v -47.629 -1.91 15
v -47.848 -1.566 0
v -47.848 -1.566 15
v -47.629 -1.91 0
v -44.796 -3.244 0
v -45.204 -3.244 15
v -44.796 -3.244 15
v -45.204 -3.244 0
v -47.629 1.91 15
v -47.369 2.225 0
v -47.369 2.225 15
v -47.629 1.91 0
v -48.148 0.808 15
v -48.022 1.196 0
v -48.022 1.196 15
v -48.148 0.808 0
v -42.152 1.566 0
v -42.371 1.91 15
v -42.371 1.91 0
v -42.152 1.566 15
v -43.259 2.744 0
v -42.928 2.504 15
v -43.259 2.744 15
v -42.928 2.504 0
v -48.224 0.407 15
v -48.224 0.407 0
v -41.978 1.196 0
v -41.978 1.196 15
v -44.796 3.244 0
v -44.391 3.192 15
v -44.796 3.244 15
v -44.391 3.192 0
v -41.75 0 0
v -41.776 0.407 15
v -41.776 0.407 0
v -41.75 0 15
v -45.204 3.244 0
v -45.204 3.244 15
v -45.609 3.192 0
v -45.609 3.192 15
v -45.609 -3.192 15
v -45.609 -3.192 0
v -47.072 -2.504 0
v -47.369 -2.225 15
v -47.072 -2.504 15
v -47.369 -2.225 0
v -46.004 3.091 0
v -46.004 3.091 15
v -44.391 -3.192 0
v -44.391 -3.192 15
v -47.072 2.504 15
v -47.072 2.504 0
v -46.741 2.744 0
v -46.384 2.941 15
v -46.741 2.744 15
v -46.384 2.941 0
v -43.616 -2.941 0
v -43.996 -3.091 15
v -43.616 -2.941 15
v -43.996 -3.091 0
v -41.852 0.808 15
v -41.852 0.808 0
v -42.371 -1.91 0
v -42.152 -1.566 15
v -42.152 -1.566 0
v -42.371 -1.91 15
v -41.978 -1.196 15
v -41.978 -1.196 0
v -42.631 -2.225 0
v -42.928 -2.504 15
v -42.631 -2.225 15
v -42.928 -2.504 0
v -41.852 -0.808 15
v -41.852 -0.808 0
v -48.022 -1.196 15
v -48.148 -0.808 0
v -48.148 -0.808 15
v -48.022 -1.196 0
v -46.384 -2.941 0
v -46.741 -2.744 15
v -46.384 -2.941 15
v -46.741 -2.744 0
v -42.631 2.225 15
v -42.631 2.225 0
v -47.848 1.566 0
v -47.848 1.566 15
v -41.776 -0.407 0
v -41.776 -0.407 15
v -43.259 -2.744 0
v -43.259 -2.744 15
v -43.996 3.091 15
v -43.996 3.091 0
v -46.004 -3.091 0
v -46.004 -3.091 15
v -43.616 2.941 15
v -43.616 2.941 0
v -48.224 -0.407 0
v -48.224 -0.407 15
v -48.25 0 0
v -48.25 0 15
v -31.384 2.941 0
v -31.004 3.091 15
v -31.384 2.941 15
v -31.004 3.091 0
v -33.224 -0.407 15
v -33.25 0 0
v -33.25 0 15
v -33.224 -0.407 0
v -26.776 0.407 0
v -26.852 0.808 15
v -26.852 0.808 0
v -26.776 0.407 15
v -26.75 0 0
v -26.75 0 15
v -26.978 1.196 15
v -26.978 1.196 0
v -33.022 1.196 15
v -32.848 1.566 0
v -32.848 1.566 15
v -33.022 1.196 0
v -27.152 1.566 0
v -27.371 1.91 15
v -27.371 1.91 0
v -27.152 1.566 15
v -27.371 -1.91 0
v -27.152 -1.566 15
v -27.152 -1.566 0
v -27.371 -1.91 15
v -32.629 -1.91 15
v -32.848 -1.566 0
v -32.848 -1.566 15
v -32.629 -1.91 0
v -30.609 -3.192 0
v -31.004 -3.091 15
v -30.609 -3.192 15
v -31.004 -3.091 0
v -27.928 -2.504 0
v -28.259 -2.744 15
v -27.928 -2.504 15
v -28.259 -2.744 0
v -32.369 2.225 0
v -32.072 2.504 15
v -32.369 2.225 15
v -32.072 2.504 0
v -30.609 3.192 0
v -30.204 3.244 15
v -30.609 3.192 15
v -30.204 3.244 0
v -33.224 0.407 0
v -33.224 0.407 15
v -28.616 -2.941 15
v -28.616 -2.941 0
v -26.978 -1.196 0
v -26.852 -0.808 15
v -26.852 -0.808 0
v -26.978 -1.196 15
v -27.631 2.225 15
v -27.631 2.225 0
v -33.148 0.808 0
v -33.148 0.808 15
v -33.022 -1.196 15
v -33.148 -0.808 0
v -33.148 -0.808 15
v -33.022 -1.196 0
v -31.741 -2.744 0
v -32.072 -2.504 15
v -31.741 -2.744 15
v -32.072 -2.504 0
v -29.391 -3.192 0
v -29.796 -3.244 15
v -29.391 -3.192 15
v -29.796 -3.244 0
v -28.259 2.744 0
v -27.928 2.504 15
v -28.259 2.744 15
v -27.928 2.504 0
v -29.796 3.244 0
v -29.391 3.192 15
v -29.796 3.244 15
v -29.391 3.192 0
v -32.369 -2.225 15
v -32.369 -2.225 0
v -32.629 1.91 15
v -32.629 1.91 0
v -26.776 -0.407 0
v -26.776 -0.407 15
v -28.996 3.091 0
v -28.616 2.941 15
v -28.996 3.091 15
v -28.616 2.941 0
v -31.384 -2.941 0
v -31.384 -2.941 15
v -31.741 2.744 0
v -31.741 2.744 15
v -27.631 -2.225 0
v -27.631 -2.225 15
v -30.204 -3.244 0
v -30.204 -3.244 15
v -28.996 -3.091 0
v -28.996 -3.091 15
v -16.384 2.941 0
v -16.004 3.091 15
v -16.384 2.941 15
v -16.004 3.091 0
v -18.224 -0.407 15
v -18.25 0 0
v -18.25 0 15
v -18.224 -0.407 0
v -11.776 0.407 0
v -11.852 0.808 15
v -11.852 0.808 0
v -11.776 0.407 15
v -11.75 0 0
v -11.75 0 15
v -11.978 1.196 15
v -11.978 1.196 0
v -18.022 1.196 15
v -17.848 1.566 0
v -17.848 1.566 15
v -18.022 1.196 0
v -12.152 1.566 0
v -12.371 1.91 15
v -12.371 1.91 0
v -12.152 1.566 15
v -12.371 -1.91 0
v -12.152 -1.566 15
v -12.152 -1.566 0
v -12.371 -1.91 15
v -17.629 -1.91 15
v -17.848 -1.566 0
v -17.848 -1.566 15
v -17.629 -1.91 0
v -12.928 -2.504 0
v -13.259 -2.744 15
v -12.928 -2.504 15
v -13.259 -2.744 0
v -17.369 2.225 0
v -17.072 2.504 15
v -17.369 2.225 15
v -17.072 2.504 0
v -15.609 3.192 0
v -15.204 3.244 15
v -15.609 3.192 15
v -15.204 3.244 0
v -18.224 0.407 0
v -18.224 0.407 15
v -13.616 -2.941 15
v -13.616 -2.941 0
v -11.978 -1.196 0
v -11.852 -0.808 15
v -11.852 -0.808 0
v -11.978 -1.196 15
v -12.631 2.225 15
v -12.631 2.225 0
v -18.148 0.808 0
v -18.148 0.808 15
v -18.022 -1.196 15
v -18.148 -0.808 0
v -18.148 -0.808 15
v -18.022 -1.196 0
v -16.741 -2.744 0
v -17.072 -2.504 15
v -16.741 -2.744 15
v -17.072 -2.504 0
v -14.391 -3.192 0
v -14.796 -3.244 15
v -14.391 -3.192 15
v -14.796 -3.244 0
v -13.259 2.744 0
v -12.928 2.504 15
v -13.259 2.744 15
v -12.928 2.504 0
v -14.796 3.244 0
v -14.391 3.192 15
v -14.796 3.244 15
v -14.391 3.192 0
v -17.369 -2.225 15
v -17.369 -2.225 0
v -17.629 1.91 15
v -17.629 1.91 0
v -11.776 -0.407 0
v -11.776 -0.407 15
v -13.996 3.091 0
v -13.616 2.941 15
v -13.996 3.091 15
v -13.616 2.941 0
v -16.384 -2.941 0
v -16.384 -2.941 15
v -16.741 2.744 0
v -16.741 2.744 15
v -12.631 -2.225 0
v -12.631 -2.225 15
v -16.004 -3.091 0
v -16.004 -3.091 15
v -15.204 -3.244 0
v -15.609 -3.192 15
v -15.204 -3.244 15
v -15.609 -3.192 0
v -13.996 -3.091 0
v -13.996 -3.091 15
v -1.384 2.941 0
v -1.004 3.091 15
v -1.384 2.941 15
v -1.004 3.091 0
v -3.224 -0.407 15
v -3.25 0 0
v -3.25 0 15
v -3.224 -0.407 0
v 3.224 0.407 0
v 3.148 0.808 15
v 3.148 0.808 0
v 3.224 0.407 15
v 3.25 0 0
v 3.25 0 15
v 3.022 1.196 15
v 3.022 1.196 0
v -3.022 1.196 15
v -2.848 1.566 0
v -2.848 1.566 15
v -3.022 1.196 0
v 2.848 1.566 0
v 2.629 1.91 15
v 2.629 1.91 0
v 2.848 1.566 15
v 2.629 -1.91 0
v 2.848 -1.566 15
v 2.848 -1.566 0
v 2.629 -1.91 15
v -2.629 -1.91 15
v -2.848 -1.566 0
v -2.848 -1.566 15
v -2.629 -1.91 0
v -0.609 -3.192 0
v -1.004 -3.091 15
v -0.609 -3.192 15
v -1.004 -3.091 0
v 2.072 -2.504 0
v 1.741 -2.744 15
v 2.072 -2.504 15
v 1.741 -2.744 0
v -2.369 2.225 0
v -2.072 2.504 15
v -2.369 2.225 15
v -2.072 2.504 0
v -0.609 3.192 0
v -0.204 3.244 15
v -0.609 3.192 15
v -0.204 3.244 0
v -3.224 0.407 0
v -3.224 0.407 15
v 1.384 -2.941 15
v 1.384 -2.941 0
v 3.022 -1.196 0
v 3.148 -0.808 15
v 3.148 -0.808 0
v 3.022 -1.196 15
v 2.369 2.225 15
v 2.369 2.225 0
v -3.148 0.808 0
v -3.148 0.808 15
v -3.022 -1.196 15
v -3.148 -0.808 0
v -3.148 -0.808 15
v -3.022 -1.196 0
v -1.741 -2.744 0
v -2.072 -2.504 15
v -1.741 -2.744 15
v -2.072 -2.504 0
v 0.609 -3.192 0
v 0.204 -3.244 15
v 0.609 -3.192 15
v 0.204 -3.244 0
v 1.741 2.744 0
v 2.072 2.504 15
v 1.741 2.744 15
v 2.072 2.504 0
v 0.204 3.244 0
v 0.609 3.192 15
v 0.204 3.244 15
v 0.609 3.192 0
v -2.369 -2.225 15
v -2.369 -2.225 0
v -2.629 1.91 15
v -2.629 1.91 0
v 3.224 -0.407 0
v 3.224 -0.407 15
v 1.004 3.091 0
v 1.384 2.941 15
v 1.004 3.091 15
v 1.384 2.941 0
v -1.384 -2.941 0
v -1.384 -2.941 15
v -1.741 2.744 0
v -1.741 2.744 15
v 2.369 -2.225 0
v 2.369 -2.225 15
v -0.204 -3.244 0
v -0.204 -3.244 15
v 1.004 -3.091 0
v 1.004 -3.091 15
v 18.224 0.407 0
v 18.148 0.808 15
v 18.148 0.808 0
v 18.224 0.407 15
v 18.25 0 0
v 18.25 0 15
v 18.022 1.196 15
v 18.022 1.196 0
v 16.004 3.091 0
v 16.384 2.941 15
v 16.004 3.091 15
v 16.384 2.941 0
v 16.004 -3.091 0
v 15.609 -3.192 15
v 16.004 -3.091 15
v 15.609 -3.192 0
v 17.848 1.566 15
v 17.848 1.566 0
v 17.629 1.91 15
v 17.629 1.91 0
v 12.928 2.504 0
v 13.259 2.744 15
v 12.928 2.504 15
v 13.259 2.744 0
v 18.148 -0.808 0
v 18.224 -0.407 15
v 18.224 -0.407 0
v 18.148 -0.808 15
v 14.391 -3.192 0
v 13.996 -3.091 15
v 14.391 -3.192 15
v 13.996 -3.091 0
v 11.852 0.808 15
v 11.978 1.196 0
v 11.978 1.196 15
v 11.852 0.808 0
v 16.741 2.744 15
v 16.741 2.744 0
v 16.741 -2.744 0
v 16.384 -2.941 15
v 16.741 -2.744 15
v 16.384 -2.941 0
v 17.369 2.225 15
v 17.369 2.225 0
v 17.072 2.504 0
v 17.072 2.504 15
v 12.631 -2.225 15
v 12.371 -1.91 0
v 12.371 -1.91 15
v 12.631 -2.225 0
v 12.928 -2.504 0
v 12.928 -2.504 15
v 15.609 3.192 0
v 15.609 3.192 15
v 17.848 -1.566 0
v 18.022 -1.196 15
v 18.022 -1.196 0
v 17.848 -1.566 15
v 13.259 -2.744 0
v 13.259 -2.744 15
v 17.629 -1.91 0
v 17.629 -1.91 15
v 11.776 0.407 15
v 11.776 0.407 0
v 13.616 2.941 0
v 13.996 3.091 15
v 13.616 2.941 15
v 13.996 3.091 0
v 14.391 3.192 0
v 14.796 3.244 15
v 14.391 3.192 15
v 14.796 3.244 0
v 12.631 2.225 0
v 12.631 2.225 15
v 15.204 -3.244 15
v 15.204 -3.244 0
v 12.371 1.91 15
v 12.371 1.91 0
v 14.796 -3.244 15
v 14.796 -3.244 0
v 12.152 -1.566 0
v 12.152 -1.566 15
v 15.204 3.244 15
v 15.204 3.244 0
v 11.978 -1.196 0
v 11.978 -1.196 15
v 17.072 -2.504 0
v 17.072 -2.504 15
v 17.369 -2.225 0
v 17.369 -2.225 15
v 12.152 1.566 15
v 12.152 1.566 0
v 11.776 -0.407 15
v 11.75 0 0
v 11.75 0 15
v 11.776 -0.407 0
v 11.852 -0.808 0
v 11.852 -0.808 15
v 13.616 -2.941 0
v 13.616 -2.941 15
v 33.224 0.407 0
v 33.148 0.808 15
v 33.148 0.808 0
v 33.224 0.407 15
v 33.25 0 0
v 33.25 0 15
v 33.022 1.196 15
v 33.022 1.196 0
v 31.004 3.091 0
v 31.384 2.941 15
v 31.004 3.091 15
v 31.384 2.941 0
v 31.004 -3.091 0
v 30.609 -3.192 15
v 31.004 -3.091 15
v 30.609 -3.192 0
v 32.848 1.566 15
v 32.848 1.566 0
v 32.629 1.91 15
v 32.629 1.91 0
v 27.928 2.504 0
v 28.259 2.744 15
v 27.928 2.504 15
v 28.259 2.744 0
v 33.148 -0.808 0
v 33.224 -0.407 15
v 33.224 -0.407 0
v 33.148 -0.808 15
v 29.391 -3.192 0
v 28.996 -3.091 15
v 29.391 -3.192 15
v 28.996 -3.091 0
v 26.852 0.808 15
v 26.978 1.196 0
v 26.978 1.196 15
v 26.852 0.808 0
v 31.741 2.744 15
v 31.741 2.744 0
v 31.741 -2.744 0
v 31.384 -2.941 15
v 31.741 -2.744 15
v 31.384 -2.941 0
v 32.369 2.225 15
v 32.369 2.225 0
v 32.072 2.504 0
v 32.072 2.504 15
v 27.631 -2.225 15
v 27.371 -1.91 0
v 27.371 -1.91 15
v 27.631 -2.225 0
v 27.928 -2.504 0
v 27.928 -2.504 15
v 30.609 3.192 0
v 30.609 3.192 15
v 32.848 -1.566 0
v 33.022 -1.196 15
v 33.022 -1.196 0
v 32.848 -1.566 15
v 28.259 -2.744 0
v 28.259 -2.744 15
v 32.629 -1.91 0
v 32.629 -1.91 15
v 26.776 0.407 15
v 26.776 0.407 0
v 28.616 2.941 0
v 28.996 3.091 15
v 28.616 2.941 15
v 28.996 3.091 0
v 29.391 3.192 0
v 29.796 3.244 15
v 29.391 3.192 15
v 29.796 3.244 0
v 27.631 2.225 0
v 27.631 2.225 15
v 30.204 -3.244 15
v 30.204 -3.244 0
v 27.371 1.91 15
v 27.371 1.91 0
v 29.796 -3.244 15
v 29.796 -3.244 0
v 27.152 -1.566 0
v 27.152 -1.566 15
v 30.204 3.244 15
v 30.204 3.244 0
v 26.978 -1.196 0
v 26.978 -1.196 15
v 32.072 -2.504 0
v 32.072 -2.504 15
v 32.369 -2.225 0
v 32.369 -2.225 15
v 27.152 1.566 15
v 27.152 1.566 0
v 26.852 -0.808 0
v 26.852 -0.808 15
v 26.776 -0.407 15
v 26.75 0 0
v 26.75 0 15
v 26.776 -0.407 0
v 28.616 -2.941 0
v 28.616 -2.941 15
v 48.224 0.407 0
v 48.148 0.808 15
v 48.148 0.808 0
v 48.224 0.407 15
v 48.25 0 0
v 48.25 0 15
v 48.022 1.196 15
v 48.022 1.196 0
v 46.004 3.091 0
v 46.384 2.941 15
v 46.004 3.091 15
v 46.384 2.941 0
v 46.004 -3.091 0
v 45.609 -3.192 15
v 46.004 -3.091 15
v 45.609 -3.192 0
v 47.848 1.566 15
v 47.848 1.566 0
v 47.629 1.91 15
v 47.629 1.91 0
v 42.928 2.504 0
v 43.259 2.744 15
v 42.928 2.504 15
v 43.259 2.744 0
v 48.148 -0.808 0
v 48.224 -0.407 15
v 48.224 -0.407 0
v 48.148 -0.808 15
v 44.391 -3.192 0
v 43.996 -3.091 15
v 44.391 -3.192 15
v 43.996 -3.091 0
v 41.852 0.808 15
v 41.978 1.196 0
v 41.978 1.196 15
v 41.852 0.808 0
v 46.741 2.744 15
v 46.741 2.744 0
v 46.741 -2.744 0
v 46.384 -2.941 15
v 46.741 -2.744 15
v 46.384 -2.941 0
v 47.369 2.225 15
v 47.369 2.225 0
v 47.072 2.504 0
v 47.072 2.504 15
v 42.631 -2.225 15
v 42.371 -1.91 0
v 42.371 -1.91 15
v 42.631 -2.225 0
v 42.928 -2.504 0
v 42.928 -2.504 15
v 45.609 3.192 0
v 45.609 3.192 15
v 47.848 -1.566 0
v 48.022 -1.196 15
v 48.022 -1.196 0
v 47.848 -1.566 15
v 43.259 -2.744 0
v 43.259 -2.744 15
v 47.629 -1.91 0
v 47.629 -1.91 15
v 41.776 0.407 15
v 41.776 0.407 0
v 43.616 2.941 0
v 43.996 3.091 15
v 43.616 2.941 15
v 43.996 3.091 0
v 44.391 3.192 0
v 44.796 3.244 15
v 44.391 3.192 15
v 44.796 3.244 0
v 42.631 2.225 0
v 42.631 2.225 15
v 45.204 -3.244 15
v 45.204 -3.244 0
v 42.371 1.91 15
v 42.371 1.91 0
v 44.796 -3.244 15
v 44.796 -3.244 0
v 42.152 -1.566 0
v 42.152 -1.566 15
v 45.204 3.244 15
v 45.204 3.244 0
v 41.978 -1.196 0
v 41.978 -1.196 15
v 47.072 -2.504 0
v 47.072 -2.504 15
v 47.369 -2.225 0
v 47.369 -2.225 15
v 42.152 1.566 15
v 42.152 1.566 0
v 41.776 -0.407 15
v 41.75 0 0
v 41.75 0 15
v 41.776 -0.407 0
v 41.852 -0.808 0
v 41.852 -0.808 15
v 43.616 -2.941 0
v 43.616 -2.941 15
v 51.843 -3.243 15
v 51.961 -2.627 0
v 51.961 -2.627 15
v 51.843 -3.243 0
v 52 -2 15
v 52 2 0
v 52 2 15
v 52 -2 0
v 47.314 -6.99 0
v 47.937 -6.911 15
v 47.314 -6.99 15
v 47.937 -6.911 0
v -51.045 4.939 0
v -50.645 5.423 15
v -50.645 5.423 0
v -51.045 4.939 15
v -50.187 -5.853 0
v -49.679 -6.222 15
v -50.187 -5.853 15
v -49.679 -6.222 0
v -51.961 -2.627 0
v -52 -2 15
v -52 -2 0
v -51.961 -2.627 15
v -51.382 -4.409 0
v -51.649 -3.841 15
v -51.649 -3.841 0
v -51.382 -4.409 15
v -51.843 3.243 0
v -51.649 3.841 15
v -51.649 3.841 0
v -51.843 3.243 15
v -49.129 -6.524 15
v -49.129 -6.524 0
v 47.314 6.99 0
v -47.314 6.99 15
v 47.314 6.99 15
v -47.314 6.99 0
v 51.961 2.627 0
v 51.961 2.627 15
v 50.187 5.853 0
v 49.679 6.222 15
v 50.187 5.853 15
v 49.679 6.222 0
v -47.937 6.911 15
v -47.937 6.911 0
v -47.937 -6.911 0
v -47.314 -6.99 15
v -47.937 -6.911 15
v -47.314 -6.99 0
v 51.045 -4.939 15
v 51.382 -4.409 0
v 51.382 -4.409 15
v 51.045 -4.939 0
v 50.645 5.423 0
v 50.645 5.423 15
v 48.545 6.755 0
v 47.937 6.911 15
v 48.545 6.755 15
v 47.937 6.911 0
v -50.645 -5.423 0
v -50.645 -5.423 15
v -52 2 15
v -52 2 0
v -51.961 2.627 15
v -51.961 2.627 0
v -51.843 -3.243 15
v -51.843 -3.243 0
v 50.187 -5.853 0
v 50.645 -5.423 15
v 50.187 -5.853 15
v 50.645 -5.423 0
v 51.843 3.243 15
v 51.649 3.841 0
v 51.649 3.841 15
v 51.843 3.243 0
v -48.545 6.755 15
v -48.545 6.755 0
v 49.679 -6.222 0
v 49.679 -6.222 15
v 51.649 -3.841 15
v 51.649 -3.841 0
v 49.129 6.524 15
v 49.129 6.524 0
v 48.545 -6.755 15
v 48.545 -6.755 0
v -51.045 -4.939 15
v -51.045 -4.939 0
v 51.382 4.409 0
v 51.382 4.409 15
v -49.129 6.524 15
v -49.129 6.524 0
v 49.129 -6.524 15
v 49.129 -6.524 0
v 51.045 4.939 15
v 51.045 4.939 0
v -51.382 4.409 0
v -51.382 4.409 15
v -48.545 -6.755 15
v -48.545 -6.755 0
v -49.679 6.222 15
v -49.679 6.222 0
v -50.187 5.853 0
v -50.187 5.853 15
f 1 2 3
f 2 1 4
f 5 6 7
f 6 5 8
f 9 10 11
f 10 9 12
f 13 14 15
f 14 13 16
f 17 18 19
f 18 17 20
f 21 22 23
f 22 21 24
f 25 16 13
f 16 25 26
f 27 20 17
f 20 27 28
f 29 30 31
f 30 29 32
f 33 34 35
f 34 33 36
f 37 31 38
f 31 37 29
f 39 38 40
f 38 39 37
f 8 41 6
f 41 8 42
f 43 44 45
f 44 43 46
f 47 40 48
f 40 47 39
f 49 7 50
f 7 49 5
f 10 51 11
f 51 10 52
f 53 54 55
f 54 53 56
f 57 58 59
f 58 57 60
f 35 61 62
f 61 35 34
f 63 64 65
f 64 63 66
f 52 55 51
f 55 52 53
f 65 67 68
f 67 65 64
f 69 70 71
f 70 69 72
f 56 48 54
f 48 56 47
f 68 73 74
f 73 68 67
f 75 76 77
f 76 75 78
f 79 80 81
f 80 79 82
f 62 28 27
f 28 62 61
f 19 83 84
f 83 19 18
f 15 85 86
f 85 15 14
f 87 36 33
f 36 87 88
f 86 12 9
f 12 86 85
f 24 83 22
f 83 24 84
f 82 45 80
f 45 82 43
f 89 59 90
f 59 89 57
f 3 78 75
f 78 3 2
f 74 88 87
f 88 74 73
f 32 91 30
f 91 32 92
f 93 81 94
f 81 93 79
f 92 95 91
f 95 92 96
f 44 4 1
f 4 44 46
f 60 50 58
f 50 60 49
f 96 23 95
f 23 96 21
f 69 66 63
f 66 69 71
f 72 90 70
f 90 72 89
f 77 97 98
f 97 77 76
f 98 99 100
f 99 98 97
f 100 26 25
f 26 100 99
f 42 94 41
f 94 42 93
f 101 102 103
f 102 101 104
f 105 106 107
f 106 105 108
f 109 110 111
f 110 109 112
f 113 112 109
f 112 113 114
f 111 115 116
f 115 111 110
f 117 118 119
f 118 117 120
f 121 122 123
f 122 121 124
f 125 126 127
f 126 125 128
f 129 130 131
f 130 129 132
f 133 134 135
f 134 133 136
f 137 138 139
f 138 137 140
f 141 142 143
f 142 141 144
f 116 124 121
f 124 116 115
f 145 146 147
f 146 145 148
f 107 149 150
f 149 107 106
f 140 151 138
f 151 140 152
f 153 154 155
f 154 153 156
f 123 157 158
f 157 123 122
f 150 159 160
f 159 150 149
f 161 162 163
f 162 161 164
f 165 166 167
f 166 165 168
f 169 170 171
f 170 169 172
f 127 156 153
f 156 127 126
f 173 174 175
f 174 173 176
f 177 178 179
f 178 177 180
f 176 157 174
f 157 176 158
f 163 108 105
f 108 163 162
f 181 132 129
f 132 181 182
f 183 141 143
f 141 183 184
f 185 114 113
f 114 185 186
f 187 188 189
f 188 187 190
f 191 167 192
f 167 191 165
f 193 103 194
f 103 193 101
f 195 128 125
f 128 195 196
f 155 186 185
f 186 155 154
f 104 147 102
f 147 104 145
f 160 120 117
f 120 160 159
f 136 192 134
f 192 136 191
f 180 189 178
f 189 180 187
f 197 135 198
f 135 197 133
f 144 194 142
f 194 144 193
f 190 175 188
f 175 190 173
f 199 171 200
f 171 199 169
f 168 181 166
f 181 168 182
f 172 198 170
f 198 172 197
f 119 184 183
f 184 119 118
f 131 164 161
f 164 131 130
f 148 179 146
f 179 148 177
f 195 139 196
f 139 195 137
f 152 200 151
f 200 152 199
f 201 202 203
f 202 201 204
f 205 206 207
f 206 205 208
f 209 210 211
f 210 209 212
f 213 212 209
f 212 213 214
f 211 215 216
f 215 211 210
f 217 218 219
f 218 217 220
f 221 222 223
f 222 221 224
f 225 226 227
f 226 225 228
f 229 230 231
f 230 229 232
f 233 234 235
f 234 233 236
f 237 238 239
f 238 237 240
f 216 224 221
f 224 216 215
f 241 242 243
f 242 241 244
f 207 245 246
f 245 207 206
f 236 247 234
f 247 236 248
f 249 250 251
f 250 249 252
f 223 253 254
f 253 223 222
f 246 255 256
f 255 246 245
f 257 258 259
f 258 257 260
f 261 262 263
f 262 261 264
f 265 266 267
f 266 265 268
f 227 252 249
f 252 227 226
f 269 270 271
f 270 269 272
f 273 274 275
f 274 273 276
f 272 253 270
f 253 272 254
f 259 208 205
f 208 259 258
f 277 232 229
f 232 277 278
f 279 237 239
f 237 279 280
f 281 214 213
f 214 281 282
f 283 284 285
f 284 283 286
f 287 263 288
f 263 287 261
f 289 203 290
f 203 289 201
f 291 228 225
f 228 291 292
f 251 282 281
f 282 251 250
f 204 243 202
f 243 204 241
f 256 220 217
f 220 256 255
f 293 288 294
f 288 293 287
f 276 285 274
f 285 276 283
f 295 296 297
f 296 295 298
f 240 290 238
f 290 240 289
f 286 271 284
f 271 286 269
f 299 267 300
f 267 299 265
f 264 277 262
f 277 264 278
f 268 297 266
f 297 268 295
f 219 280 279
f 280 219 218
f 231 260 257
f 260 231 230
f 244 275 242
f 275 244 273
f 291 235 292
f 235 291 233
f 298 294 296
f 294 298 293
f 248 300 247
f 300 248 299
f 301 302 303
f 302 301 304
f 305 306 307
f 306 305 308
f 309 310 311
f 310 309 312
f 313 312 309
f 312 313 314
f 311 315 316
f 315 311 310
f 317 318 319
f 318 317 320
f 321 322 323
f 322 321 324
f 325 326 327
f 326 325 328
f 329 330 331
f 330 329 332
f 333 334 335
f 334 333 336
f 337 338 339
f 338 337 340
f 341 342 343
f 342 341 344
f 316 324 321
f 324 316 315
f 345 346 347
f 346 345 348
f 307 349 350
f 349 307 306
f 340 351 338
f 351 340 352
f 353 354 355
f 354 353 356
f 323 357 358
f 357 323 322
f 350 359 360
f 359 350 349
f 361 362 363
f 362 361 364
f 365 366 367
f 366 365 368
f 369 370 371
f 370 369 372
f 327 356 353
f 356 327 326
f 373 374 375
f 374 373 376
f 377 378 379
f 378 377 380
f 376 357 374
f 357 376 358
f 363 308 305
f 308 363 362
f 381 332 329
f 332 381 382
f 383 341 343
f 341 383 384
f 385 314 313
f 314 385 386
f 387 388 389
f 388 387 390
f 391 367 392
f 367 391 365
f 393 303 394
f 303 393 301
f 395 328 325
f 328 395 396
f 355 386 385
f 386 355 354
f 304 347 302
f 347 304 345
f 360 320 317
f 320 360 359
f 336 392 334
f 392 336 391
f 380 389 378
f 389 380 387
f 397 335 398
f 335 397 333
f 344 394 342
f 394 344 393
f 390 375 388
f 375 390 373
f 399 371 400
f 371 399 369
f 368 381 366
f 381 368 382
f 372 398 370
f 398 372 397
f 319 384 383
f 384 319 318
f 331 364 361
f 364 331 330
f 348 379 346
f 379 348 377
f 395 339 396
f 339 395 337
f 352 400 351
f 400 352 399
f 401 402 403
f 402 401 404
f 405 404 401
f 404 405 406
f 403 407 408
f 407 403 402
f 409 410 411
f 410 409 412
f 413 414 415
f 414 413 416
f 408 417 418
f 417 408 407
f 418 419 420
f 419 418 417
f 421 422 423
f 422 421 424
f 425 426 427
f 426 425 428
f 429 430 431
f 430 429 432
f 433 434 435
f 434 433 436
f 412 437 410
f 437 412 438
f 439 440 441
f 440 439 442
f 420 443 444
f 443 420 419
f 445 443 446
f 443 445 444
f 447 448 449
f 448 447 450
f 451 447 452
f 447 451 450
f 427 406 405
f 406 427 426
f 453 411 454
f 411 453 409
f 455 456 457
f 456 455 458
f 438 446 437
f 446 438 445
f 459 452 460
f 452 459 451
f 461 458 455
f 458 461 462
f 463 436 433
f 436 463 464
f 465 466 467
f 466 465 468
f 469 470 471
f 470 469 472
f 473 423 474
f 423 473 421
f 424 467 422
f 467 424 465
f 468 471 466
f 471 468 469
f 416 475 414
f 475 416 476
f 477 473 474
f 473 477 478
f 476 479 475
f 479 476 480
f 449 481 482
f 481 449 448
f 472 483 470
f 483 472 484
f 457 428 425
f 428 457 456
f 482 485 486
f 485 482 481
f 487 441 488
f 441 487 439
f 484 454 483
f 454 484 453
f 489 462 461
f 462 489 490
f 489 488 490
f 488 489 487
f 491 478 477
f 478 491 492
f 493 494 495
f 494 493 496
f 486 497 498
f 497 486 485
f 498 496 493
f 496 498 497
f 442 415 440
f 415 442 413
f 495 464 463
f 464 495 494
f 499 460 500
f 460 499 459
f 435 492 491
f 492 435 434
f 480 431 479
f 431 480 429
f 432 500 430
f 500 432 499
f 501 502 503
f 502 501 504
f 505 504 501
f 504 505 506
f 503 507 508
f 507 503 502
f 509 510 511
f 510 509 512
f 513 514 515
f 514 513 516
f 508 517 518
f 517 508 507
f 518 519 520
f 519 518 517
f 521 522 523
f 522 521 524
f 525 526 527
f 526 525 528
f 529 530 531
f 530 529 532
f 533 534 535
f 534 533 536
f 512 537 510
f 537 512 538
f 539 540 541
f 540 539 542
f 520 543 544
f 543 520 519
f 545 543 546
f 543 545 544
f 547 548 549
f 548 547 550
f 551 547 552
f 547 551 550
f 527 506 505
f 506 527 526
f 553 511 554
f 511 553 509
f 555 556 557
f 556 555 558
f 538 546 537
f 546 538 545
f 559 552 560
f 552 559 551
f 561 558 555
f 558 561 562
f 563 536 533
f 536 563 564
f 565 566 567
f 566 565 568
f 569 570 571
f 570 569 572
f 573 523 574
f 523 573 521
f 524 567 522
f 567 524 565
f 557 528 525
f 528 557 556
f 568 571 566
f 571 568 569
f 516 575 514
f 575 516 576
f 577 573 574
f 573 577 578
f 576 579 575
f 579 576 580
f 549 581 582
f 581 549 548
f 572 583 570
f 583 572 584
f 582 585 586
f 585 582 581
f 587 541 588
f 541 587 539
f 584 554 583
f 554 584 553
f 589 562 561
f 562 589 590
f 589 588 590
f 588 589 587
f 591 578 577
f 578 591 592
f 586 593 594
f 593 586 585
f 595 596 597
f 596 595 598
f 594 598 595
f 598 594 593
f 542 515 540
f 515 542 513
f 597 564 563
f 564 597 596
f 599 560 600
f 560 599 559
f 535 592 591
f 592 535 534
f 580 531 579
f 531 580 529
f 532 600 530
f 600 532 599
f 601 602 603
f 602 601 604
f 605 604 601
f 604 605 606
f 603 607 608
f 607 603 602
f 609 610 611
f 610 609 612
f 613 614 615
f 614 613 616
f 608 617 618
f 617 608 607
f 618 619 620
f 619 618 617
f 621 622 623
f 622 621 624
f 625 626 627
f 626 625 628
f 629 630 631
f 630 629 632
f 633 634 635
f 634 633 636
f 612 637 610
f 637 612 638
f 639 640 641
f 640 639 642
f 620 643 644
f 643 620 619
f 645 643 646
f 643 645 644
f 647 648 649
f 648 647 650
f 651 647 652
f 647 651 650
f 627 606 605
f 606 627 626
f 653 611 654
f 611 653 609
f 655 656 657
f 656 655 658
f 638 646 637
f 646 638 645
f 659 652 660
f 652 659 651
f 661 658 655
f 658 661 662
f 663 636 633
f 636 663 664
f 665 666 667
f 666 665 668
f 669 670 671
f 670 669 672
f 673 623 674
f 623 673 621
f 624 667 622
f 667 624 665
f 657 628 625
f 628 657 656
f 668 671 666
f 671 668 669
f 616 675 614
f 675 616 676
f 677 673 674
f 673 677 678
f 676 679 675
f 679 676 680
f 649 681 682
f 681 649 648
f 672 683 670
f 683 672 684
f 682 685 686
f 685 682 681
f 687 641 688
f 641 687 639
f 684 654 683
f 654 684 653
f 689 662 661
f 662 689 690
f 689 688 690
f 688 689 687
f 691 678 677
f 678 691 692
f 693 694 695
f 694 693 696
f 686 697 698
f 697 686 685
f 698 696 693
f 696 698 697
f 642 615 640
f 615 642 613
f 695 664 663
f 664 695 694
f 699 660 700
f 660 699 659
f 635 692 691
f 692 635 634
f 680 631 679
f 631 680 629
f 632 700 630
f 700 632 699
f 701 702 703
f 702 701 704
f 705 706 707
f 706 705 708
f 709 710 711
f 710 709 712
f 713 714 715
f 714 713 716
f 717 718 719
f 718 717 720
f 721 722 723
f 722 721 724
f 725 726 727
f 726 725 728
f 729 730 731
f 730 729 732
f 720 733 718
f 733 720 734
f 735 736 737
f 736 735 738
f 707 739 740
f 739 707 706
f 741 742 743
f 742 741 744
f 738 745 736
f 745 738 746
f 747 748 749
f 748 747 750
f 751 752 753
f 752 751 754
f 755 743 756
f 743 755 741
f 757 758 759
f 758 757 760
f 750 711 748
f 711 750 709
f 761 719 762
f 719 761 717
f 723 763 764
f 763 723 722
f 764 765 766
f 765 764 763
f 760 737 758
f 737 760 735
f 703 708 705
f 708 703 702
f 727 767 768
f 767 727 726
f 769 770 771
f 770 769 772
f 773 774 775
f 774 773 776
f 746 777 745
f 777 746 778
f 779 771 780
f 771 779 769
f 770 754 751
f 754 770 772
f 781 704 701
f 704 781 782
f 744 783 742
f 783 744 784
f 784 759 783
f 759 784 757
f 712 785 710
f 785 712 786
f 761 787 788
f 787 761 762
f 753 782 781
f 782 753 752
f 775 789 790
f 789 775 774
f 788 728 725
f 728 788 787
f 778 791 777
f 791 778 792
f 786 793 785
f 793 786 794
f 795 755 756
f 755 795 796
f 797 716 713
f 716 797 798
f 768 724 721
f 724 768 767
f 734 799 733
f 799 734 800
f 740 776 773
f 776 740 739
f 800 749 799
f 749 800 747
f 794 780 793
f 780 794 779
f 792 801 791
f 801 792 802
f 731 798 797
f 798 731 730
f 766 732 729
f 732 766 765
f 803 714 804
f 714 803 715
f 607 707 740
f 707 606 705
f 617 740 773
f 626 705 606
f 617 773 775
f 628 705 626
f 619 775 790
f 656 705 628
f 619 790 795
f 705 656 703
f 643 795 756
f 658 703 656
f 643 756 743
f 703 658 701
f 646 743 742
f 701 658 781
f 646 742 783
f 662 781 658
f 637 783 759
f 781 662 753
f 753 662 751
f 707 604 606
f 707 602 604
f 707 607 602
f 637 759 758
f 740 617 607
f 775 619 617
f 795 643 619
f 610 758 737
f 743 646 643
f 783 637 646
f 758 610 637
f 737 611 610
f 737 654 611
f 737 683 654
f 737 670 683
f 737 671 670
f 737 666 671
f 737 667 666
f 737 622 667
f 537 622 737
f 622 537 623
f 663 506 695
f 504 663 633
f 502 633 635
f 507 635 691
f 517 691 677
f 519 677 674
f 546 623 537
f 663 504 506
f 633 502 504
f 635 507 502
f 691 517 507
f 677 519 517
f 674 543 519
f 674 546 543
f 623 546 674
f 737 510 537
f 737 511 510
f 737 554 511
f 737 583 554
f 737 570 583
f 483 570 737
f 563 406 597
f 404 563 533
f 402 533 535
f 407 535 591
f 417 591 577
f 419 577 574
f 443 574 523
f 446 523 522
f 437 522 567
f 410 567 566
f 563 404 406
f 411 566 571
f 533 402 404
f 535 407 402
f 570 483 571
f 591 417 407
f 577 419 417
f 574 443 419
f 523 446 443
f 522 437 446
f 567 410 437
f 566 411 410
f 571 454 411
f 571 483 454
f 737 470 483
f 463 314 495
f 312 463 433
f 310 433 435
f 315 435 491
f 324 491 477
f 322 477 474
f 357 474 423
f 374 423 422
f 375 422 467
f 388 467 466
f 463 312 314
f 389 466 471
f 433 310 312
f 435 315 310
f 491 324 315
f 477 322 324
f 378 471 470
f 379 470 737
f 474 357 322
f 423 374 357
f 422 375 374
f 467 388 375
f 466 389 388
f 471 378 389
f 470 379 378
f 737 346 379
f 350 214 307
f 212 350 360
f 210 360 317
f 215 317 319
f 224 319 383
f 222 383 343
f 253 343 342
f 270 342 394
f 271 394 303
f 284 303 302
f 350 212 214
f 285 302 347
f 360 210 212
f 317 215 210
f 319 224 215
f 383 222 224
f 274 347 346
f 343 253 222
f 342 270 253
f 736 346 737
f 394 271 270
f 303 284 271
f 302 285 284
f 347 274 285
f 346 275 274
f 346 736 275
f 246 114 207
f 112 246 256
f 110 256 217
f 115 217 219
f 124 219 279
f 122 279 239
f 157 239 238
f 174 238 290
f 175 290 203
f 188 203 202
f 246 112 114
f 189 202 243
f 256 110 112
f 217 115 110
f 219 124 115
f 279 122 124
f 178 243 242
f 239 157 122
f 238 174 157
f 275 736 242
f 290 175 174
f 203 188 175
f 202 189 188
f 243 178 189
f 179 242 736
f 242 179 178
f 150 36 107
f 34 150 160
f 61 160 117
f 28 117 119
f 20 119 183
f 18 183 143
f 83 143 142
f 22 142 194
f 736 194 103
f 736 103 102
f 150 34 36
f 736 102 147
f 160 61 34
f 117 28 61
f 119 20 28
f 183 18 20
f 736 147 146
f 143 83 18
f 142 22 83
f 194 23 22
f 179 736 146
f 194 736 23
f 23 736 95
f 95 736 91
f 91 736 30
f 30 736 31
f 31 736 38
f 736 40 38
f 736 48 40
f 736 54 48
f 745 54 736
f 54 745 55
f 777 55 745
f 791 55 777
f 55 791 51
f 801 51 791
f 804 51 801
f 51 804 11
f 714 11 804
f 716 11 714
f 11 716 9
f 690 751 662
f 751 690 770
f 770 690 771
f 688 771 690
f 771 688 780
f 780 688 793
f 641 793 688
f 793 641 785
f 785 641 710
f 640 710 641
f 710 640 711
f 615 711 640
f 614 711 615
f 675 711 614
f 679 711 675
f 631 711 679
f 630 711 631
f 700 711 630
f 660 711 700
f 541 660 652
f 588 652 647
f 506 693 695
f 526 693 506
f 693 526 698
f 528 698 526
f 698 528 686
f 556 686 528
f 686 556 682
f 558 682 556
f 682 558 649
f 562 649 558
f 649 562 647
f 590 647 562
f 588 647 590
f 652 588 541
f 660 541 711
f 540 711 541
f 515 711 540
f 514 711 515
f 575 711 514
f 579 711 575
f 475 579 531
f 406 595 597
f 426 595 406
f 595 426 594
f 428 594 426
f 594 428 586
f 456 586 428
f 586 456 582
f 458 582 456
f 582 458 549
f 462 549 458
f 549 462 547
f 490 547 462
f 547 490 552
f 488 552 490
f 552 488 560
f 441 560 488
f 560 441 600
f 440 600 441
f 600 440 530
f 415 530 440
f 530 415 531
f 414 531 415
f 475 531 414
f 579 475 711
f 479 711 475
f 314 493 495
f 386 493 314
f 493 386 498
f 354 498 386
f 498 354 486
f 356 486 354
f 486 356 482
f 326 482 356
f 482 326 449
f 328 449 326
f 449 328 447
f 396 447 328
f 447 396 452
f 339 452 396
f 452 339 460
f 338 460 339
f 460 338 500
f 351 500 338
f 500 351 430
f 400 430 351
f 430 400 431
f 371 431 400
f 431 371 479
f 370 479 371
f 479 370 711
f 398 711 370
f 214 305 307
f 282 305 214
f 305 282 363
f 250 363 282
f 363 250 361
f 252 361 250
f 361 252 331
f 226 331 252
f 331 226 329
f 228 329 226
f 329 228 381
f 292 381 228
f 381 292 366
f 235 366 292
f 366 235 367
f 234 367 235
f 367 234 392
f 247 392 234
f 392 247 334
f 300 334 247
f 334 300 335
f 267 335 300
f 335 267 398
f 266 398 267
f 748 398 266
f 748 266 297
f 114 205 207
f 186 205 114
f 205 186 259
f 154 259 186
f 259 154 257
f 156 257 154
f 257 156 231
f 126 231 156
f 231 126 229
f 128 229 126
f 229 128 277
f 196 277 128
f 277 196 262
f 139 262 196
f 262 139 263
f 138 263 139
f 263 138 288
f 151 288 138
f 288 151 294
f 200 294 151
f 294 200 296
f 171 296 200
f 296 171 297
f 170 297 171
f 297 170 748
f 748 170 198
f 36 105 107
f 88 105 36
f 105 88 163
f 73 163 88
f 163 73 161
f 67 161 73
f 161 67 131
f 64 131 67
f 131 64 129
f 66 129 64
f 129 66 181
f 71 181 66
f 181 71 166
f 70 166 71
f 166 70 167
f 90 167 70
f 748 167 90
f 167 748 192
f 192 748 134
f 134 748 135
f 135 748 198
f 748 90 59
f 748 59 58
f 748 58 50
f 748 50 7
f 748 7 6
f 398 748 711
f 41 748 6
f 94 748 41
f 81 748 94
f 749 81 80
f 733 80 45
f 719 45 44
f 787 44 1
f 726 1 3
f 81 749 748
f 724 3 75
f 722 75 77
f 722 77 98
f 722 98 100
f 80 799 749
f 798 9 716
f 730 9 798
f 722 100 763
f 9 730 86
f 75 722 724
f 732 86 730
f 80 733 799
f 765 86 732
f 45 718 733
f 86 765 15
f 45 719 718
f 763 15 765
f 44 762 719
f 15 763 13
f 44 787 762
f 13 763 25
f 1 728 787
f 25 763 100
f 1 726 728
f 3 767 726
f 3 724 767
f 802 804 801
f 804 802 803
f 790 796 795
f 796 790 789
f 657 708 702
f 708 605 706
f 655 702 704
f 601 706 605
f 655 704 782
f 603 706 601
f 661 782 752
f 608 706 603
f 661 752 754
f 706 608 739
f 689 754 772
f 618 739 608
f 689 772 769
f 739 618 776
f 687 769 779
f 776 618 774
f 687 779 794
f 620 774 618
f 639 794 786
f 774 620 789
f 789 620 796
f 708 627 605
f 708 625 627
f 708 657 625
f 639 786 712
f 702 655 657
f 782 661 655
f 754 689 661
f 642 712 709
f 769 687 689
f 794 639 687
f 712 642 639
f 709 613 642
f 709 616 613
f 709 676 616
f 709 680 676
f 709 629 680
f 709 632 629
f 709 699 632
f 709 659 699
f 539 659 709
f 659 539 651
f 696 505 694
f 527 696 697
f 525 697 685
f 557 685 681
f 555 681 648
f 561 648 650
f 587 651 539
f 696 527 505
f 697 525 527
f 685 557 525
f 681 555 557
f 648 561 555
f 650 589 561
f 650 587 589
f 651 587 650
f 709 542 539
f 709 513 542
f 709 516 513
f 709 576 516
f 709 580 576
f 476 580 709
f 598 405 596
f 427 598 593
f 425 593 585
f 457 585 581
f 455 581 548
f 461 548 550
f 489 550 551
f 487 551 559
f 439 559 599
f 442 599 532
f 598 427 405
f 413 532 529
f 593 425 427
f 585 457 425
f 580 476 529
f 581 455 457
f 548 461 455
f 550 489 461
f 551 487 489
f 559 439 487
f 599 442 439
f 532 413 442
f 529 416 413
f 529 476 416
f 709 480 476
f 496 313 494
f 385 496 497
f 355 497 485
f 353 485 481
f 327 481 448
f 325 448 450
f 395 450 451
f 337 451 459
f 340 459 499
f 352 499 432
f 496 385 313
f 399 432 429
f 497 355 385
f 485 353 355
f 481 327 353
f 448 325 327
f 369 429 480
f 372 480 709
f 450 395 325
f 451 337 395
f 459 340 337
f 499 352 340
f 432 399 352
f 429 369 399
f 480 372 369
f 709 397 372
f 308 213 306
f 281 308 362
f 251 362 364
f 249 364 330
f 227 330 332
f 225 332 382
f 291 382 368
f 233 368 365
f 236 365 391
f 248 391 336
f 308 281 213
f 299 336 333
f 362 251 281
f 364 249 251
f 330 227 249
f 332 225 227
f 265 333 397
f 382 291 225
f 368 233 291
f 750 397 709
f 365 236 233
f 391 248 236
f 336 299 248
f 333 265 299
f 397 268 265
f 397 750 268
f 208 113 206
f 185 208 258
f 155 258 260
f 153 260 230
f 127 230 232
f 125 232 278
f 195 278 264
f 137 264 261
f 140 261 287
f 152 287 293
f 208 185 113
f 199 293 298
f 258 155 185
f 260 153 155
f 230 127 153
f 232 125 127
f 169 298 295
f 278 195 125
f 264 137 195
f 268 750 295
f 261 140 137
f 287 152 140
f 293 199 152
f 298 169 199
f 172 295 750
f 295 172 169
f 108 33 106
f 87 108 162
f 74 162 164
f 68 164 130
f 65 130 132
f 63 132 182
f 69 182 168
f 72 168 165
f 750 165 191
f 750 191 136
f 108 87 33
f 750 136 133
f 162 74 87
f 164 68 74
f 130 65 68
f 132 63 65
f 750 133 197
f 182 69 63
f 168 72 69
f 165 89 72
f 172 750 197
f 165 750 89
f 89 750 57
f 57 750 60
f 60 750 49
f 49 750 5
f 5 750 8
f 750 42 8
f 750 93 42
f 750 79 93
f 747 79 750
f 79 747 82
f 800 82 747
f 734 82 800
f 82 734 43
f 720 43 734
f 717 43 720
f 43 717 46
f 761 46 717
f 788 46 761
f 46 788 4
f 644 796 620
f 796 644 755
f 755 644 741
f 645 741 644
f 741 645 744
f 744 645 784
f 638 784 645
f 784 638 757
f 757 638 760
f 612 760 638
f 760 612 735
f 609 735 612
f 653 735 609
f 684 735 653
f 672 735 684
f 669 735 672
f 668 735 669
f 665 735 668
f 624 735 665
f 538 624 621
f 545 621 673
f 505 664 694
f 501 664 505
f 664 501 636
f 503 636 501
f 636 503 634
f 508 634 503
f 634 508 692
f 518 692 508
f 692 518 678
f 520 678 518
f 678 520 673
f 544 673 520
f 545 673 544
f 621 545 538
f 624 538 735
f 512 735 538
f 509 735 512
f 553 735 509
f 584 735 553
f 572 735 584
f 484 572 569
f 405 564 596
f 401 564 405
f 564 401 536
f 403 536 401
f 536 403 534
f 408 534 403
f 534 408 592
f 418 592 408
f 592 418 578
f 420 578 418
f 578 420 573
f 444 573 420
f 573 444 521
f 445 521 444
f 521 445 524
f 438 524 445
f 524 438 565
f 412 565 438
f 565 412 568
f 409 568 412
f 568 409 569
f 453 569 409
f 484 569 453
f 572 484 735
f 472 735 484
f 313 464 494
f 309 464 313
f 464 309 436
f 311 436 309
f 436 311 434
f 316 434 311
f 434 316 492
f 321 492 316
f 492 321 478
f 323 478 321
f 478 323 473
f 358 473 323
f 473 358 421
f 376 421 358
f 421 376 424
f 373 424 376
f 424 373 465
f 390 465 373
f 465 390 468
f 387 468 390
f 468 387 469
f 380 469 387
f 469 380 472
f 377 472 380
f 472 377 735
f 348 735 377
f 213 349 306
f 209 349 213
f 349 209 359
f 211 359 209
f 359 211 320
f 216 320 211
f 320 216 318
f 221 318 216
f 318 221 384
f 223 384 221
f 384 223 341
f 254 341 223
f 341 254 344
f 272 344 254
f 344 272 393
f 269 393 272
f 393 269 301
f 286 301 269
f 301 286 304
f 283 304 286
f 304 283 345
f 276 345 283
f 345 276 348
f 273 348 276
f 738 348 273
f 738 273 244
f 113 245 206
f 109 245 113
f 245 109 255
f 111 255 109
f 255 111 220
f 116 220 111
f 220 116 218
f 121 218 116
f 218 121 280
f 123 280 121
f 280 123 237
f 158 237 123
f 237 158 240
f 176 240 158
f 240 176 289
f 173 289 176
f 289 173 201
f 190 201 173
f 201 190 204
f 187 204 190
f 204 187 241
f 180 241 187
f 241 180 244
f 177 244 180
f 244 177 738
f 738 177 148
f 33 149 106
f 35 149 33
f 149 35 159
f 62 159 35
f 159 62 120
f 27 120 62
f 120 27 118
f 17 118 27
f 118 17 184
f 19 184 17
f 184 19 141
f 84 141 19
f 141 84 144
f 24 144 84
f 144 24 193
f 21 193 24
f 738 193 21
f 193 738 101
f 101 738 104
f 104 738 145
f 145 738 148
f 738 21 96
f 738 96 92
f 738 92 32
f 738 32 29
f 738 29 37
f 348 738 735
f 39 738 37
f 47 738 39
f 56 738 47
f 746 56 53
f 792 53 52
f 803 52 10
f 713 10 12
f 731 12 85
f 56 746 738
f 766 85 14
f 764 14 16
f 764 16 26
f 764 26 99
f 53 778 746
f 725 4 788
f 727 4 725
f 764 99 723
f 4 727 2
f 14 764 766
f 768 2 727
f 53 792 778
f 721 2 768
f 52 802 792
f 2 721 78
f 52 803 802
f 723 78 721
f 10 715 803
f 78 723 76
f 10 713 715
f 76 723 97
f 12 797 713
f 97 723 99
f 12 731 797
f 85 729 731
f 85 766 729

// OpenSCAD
$fn = 50;


difference() {
	union() {
		hull() {
			translate(v = [-47.0000000000, 2.0000000000, 0]) {
				cylinder(h = 15, r = 5);
			}
			translate(v = [47.0000000000, 2.0000000000, 0]) {
				cylinder(h = 15, r = 5);
			}
			translate(v = [-47.0000000000, -2.0000000000, 0]) {
				cylinder(h = 15, r = 5);
			}
			translate(v = [47.0000000000, -2.0000000000, 0]) {
				cylinder(h = 15, r = 5);
			}
		}
	}
	union() {
		translate(v = [-45.0000000000, 0.0000000000, 0]) {
			translate(v = [0, 0, -100]) {
				cylinder(h = 200, r = 3.2500000000);
			}
		}
		translate(v = [-30.0000000000, 0.0000000000, 0]) {
			translate(v = [0, 0, -100]) {
				cylinder(h = 200, r = 3.2500000000);
			}
		}
		translate(v = [-15.0000000000, 0.0000000000, 0]) {
			translate(v = [0, 0, -100]) {
				cylinder(h = 200, r = 3.2500000000);
			}
		}
		translate(v = [0, 0, -100]) {
			cylinder(h = 200, r = 3.2500000000);
		}
		translate(v = [15.0000000000, 0.0000000000, 0]) {
			translate(v = [0, 0, -100]) {
				cylinder(h = 200, r = 3.2500000000);
			}
		}
		translate(v = [30.0000000000, 0.0000000000, 0]) {
			translate(v = [0, 0, -100]) {
				cylinder(h = 200, r = 3.2500000000);
			}
		}
		translate(v = [45.0000000000, 0.0000000000, 0]) {
			translate(v = [0, 0, -100]) {
				cylinder(h = 200, r = 3.2500000000);
			}
		}
	}
}
